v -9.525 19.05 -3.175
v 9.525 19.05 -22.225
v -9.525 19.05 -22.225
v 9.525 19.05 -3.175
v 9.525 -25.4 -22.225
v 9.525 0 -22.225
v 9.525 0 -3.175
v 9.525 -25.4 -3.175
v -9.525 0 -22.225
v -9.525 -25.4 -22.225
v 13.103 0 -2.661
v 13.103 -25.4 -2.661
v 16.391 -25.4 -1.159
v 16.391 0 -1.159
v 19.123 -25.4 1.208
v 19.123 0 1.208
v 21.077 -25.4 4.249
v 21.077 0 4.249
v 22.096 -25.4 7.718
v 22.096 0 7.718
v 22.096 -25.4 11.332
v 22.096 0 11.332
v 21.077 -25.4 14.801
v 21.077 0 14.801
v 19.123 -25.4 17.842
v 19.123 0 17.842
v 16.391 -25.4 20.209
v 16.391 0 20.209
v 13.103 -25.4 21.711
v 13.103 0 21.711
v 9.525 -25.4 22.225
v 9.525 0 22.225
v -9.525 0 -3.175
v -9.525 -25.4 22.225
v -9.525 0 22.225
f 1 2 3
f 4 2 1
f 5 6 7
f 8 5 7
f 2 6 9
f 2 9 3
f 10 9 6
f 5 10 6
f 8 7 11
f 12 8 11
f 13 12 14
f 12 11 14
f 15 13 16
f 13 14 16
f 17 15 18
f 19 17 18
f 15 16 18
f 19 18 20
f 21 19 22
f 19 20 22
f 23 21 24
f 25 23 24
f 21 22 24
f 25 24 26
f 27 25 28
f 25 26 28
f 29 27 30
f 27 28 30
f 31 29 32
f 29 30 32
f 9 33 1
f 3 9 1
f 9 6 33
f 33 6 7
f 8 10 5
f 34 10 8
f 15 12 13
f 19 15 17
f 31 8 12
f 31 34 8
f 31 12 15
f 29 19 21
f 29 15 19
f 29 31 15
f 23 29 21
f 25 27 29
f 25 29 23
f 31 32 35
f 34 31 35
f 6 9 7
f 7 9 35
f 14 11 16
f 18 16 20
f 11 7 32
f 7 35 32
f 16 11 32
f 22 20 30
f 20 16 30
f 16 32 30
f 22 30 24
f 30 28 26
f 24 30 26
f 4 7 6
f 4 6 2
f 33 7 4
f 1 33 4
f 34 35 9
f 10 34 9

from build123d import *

# Parameters (mm, degrees)
F1_DEPTH = 25.4
F2_W     = 19.05
F2_H     = 19.05
F3_DEPTH = 19.05


with BuildPart() as f1:
    # F0 (on Front) → F1 (new body)
    with BuildSketch(Plane.XZ):
        with BuildLine():
            Line((-9.525, -22.225), (9.525, -22.225))
            Line((9.525, -22.225), (9.525, -3.175))
            ThreePointArc((9.525, -3.175), (22.225, 9.525), (9.525, 22.225))
            Line((9.525, 22.225), (-9.525, 22.225))
            Line((-9.525, 22.225), (-9.525, -22.225))
        make_face()
    extrude(amount=F1_DEPTH)


with BuildPart() as f3:
    # F2 (on face) → F3 (new body)
    with BuildSketch(Plane.YZ.offset(9.525)):
        with Locations((9.525, -12.7)):
            Rectangle(F2_W, F2_H)
    extrude(amount=-F3_DEPTH)


solid = Compound([f1.part, f3.part])
